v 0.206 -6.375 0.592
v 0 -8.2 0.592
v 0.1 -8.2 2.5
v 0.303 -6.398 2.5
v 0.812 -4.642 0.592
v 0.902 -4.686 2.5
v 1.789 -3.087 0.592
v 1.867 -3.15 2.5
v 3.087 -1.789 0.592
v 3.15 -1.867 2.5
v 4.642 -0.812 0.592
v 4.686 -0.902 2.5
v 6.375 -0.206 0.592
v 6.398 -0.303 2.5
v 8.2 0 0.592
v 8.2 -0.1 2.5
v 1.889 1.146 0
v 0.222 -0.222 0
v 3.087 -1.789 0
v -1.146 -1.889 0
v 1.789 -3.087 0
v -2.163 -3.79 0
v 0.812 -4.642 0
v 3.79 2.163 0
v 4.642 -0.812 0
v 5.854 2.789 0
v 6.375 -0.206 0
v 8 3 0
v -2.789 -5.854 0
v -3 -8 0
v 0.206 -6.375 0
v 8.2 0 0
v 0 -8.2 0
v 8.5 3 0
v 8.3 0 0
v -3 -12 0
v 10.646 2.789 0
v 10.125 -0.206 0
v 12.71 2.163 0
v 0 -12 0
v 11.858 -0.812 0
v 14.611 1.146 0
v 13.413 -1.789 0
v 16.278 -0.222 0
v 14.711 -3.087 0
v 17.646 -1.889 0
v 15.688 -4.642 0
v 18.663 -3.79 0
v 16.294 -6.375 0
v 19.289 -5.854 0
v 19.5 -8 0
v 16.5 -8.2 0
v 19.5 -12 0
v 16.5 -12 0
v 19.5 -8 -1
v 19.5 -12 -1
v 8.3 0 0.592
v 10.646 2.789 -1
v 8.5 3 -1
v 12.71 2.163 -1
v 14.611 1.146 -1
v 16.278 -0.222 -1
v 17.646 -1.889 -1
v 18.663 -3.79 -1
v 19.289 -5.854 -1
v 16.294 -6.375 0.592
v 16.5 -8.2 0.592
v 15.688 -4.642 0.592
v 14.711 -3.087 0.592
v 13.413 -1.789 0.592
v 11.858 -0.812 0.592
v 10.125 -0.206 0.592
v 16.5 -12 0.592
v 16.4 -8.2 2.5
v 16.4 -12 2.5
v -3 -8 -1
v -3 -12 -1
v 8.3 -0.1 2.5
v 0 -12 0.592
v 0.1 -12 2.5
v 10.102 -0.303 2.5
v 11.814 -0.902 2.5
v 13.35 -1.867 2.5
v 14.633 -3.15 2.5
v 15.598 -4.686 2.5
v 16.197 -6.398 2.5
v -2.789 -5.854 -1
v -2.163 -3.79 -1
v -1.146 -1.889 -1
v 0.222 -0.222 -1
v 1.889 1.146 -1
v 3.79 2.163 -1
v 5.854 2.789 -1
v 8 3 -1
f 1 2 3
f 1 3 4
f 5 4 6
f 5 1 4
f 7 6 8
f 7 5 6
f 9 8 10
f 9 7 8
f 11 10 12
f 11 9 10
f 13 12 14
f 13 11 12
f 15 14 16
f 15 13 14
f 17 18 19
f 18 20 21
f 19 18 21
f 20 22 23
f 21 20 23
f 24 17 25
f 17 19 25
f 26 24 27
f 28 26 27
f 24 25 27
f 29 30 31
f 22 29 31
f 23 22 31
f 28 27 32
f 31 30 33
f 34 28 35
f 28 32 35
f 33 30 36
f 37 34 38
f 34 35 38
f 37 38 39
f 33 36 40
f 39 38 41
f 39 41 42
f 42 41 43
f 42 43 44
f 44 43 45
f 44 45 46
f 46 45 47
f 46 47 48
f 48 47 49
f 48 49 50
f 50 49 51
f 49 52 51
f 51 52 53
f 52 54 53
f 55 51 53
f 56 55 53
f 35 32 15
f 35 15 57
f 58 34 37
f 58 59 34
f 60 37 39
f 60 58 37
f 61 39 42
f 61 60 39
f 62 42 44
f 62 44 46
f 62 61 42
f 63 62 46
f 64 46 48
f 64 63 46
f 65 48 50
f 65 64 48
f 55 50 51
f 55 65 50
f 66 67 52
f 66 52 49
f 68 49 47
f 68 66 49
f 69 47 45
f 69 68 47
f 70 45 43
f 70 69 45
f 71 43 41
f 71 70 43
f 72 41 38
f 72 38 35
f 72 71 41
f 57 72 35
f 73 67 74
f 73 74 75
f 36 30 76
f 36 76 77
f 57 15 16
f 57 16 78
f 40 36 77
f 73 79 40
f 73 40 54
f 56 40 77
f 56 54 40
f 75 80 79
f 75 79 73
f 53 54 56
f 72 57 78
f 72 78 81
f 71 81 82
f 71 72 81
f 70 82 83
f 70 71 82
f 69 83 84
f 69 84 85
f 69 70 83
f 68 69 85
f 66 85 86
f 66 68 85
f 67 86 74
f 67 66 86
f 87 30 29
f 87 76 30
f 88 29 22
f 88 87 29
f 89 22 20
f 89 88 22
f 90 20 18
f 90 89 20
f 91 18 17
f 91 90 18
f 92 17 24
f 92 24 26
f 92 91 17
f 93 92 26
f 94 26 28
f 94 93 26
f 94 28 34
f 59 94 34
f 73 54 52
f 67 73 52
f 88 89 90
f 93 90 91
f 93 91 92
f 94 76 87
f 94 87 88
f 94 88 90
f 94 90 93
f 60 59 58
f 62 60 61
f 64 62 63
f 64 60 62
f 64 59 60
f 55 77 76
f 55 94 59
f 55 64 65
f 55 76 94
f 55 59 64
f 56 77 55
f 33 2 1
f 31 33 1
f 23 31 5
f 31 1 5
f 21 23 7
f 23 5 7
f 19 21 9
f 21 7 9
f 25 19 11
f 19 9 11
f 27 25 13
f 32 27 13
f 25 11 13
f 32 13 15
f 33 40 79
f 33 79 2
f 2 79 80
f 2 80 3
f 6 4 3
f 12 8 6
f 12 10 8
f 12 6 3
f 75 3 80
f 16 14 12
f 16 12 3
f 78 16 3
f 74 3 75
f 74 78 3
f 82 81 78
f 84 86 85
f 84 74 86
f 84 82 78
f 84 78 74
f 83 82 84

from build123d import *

# Parameters (mm, degrees)
F0_W     = 16.5
F0_H     = 12
F1_DEPTH = 2.5
F2_R     = 8.2
F3_W     = 22.5
F3_H     = 15
F4_DEPTH = 1
F5_R     = 11
F6_SIZE2 = 1.9081136688
F6_SIZE  = 0.1


with BuildPart() as f1:
    # F0 (on Top) → F1 (new body)
    with BuildSketch(Plane.XY):
        with Locations((8.25, -6)):
            Rectangle(F0_W, F0_H)
    extrude(amount=F1_DEPTH)

    # F2
    f2_edges = [f1.edges().sort_by_distance(p)[0] for p in [
        (16.5, 0, 1.25),
        (0, 0, 1.25),
    ]]
    fillet(f2_edges, radius=F2_R)

    # F3 (on face) → F4 (join)
    with BuildSketch(Plane(origin=(0, 0, 0), x_dir=(1, 0, 0), z_dir=(0, 0, -1))):
        with Locations((8.25, 4.5)):
            Rectangle(F3_W, F3_H)
    extrude(amount=F4_DEPTH)

    # F5
    f5_edges = [f1.edges().sort_by_distance(p)[0] for p in [
        (19.5, 3, -0.5),
        (-3, 3, -0.5),
    ]]
    fillet(f5_edges, radius=F5_R)

    # F6
    f6_edges = [f1.edges().sort_by_distance(p)[0] for p in [
        (0, -10.1, 2.5),
        (2.401724, -2.401724, 2.5),
        (14.098276, -2.401724, 2.5),
        (16.5, -10.1, 2.5),
    ]]
    f6_side = f1.faces().sort_by_distance((8.25, -6.711232, 2.5))[0]
    chamfer(f6_edges, length=F6_SIZE, length2=F6_SIZE2, reference=f6_side)


solid = f1.part
